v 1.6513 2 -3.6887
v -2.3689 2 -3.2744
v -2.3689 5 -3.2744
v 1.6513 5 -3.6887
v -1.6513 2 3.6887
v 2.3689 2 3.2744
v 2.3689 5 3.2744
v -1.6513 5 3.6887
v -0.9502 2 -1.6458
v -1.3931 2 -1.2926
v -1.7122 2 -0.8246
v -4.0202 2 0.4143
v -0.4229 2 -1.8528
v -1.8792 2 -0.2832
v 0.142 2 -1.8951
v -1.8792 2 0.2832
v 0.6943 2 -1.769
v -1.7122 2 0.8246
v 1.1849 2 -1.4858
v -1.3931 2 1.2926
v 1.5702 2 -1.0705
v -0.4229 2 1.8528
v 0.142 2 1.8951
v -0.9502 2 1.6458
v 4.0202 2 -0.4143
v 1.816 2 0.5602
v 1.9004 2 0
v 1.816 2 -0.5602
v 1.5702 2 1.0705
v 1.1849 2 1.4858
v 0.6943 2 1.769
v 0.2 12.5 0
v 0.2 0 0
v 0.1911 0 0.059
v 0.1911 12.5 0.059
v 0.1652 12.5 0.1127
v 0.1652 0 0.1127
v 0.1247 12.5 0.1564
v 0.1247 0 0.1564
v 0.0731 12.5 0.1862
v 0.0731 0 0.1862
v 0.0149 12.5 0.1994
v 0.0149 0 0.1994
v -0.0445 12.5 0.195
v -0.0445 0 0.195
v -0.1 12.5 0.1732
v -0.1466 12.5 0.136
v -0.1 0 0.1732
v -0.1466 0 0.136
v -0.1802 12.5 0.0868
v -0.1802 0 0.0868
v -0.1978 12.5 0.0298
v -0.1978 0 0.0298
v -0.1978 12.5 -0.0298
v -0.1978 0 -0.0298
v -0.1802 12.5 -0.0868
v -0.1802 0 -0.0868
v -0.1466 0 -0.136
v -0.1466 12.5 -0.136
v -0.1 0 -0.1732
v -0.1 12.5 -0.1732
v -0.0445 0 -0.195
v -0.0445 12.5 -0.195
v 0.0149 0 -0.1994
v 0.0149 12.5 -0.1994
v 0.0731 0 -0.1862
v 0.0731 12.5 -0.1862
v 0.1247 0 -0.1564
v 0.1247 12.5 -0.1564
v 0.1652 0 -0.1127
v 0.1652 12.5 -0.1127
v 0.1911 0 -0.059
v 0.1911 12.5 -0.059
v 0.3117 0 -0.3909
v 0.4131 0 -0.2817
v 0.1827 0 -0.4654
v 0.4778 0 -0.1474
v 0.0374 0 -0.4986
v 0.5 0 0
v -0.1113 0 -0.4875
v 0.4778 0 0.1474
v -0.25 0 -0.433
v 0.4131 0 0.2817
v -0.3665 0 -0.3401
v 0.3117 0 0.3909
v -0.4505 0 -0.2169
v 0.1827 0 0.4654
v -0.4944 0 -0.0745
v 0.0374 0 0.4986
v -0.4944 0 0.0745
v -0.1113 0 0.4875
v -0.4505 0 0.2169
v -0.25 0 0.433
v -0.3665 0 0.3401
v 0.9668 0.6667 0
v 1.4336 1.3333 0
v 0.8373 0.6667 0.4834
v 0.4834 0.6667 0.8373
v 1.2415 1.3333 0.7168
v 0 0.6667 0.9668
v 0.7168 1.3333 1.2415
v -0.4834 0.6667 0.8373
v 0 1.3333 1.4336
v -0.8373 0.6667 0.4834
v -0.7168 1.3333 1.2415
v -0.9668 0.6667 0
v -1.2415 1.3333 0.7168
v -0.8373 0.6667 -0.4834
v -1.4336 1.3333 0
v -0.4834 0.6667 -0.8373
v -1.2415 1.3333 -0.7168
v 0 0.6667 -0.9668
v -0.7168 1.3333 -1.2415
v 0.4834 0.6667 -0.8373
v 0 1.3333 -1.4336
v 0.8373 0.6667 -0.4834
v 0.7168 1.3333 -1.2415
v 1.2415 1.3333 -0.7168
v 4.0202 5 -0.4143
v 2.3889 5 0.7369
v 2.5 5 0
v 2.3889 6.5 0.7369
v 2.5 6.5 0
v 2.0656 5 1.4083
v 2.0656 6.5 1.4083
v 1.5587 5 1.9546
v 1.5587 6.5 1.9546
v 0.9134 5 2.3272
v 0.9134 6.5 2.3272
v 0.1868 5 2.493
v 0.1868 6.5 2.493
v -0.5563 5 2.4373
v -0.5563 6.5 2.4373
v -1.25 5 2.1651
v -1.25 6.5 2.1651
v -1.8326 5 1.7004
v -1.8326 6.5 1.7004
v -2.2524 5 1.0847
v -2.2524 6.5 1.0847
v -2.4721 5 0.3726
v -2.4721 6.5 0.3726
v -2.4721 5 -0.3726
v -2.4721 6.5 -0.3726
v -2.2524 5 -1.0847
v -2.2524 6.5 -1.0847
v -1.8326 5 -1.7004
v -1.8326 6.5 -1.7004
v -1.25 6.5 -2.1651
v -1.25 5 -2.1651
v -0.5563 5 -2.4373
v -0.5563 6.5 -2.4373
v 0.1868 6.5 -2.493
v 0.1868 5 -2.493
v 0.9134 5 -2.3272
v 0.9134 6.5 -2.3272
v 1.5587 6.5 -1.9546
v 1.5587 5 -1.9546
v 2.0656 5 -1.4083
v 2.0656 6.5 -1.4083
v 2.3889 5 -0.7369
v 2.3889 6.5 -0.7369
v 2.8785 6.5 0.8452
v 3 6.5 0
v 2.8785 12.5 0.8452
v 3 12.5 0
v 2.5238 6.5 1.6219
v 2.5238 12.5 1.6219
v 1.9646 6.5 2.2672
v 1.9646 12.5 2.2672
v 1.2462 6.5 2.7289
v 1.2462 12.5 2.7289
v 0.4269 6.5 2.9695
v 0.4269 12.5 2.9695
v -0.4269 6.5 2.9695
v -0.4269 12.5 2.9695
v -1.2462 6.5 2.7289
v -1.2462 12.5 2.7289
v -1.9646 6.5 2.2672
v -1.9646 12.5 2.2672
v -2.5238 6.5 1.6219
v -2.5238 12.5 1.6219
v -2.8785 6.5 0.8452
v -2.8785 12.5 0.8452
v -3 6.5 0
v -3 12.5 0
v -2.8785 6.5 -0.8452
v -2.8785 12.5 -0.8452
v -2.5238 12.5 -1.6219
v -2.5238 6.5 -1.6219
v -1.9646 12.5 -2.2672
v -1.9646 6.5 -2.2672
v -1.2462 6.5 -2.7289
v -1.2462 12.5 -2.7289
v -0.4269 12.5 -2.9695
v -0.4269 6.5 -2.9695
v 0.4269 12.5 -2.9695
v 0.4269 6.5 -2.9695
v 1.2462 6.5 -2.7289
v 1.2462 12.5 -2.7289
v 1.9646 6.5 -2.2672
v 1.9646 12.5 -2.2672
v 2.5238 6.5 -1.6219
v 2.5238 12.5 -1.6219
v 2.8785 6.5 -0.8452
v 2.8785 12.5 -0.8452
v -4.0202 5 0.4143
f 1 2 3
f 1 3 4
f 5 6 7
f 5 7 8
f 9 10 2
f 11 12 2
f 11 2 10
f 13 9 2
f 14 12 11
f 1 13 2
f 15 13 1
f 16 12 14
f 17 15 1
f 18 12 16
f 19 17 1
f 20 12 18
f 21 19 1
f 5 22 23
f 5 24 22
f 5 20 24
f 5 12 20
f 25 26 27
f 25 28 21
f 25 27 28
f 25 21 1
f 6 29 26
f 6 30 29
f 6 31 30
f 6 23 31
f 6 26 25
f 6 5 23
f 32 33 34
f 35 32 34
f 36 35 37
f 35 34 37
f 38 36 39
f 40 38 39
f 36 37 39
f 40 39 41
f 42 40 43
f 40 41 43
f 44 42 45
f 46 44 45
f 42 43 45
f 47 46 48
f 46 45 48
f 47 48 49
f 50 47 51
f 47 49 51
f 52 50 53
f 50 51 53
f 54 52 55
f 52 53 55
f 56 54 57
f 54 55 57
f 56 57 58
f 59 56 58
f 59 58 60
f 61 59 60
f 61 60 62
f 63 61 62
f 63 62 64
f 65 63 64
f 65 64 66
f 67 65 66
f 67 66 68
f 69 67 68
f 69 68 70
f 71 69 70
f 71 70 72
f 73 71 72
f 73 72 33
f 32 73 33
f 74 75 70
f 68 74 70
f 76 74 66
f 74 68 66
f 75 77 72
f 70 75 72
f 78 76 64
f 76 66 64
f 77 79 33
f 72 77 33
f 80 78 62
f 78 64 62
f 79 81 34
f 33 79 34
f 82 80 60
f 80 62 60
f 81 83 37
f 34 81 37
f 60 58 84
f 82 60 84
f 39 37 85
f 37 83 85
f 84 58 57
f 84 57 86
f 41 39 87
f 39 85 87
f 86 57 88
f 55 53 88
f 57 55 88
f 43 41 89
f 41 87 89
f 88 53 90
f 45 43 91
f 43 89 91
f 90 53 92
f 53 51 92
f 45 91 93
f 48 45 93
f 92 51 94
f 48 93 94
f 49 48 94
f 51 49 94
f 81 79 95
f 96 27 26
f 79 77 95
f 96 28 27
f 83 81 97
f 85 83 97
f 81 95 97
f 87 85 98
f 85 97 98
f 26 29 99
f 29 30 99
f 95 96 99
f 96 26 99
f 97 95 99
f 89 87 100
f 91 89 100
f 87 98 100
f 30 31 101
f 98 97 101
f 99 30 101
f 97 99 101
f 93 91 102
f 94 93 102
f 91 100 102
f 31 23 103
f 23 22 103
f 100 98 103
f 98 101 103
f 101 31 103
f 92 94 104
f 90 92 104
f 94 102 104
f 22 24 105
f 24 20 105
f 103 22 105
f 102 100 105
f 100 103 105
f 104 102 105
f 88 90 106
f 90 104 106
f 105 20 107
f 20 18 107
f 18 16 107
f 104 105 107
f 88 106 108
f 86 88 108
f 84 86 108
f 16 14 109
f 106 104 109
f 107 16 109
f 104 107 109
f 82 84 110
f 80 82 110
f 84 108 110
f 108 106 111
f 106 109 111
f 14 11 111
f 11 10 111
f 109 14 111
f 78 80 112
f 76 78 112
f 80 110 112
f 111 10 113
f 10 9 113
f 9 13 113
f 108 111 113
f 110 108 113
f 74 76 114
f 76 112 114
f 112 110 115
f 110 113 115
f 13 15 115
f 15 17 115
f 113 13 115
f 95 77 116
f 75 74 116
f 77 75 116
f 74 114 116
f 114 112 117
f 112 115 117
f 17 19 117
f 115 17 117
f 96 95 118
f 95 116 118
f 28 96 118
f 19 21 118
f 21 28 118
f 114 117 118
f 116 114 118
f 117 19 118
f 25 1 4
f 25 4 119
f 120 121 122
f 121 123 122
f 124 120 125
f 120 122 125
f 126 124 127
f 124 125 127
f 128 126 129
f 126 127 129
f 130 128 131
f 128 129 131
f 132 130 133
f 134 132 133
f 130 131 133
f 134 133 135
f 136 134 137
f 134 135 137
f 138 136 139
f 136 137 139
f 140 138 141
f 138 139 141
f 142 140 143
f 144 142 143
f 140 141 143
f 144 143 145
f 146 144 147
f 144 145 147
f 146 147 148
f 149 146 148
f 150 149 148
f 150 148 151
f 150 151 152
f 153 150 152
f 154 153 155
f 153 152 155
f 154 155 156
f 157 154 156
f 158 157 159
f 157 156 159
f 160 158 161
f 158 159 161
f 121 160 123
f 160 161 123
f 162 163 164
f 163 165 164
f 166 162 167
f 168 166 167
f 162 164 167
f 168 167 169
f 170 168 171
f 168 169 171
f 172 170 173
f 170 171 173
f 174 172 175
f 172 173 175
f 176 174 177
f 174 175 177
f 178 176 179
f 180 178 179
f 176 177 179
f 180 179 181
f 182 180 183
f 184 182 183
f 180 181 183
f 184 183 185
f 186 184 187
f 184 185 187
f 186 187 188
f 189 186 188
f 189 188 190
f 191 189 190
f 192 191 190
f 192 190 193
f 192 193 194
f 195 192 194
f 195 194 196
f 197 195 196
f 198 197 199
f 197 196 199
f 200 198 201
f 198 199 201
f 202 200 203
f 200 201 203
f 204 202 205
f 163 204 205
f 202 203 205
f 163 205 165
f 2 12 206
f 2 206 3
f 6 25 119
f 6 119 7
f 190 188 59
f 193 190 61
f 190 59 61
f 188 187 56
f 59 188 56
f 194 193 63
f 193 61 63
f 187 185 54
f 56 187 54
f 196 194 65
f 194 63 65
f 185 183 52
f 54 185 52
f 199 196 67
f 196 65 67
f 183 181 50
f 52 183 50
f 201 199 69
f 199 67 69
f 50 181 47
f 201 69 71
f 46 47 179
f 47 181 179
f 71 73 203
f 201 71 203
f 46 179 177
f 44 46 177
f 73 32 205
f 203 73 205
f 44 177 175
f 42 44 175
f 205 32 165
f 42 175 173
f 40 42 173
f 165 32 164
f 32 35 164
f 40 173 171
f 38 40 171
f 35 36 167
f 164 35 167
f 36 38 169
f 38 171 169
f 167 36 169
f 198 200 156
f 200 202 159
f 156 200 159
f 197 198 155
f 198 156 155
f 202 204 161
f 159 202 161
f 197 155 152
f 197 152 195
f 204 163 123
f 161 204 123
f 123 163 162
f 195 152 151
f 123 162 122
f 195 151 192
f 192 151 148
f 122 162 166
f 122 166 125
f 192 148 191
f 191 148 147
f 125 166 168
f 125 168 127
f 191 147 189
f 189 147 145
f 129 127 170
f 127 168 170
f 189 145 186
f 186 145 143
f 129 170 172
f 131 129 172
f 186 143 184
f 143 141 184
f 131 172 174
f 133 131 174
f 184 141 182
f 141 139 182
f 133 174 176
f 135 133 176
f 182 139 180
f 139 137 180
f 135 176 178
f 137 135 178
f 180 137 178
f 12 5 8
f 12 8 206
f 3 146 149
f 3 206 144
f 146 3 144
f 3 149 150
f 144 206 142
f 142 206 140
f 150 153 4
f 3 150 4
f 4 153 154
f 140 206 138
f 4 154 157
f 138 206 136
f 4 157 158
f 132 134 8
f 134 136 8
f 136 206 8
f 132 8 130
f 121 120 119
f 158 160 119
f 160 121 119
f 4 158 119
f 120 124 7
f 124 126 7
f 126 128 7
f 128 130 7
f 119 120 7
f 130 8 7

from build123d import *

# Parameters (mm, degrees)
BOSS_EXTRUDE1_DEPTH = 3
SKETCH4_R           = 0.2
CUT_EXTRUDE1_DEPTH  = 13.5


with BuildPart() as part:
    # Sketch2 → Revolve1 (revolve)
    with BuildSketch(Plane.XY):
        Polygon((3, 12.5), (0, 12.5), (0, 0), (0.5, 0), (1.900415076, 2), (3.5, 2), (3.5, 5), (2.5, 5), (2.5, 6.5), (3, 6.5), align=None)
    revolve(axis=Axis((0, 12.5, 0), (0, -1, 0)))

    # Sketch3 → Boss-Extrude1 (add)
    with BuildSketch(Plane.XZ.offset(-2)):
        Polygon((-4.020157505, 0.41432713), (-2.368896572, -3.274394961), (1.651260932, -3.688722091), (4.020157505, -0.41432713), (2.368896572, 3.274394961), (-1.651260932, 3.688722091), align=None)
    extrude(amount=-BOSS_EXTRUDE1_DEPTH)

    # Sketch4 → Cut-Extrude1 (cut, through all)
    with BuildSketch(Plane.XZ):
        Circle(SKETCH4_R)
    extrude(amount=-CUT_EXTRUDE1_DEPTH, mode=Mode.SUBTRACT)


solid = part.part
